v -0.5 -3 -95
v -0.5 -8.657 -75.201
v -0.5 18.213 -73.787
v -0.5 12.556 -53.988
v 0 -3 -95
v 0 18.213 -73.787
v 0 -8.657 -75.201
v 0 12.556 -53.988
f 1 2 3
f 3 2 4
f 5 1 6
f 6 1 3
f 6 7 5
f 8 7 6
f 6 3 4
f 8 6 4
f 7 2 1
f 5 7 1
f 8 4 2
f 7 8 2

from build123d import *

# Parameters (mm, degrees)
F1_DEPTH = 0.5
F4_ANGLE = -45


with BuildPart() as f1:
    # F0 (on Right) → F1 (new body)
    with BuildSketch(Plane.YZ):
        Polygon((-20, 0), (-30, -18), (0, -18), (10, 0), (0, 0), align=None)
    extrude(amount=F1_DEPTH)


with BuildPart() as f1_1:
    # F3: moved
    add(f1.part.moved(Location((-0.5, 30, -77))))


with BuildPart() as f1_2:
    # F4: moved
    add(f1_1.part.rotate(Axis((-0.25, 0, -95), (-1, 0, 0)), F4_ANGLE))


with BuildPart() as f1_3:
    # F5: moved
    add(f1_2.part.moved(Location((0, -3, 0))))


solid = f1_3.part
